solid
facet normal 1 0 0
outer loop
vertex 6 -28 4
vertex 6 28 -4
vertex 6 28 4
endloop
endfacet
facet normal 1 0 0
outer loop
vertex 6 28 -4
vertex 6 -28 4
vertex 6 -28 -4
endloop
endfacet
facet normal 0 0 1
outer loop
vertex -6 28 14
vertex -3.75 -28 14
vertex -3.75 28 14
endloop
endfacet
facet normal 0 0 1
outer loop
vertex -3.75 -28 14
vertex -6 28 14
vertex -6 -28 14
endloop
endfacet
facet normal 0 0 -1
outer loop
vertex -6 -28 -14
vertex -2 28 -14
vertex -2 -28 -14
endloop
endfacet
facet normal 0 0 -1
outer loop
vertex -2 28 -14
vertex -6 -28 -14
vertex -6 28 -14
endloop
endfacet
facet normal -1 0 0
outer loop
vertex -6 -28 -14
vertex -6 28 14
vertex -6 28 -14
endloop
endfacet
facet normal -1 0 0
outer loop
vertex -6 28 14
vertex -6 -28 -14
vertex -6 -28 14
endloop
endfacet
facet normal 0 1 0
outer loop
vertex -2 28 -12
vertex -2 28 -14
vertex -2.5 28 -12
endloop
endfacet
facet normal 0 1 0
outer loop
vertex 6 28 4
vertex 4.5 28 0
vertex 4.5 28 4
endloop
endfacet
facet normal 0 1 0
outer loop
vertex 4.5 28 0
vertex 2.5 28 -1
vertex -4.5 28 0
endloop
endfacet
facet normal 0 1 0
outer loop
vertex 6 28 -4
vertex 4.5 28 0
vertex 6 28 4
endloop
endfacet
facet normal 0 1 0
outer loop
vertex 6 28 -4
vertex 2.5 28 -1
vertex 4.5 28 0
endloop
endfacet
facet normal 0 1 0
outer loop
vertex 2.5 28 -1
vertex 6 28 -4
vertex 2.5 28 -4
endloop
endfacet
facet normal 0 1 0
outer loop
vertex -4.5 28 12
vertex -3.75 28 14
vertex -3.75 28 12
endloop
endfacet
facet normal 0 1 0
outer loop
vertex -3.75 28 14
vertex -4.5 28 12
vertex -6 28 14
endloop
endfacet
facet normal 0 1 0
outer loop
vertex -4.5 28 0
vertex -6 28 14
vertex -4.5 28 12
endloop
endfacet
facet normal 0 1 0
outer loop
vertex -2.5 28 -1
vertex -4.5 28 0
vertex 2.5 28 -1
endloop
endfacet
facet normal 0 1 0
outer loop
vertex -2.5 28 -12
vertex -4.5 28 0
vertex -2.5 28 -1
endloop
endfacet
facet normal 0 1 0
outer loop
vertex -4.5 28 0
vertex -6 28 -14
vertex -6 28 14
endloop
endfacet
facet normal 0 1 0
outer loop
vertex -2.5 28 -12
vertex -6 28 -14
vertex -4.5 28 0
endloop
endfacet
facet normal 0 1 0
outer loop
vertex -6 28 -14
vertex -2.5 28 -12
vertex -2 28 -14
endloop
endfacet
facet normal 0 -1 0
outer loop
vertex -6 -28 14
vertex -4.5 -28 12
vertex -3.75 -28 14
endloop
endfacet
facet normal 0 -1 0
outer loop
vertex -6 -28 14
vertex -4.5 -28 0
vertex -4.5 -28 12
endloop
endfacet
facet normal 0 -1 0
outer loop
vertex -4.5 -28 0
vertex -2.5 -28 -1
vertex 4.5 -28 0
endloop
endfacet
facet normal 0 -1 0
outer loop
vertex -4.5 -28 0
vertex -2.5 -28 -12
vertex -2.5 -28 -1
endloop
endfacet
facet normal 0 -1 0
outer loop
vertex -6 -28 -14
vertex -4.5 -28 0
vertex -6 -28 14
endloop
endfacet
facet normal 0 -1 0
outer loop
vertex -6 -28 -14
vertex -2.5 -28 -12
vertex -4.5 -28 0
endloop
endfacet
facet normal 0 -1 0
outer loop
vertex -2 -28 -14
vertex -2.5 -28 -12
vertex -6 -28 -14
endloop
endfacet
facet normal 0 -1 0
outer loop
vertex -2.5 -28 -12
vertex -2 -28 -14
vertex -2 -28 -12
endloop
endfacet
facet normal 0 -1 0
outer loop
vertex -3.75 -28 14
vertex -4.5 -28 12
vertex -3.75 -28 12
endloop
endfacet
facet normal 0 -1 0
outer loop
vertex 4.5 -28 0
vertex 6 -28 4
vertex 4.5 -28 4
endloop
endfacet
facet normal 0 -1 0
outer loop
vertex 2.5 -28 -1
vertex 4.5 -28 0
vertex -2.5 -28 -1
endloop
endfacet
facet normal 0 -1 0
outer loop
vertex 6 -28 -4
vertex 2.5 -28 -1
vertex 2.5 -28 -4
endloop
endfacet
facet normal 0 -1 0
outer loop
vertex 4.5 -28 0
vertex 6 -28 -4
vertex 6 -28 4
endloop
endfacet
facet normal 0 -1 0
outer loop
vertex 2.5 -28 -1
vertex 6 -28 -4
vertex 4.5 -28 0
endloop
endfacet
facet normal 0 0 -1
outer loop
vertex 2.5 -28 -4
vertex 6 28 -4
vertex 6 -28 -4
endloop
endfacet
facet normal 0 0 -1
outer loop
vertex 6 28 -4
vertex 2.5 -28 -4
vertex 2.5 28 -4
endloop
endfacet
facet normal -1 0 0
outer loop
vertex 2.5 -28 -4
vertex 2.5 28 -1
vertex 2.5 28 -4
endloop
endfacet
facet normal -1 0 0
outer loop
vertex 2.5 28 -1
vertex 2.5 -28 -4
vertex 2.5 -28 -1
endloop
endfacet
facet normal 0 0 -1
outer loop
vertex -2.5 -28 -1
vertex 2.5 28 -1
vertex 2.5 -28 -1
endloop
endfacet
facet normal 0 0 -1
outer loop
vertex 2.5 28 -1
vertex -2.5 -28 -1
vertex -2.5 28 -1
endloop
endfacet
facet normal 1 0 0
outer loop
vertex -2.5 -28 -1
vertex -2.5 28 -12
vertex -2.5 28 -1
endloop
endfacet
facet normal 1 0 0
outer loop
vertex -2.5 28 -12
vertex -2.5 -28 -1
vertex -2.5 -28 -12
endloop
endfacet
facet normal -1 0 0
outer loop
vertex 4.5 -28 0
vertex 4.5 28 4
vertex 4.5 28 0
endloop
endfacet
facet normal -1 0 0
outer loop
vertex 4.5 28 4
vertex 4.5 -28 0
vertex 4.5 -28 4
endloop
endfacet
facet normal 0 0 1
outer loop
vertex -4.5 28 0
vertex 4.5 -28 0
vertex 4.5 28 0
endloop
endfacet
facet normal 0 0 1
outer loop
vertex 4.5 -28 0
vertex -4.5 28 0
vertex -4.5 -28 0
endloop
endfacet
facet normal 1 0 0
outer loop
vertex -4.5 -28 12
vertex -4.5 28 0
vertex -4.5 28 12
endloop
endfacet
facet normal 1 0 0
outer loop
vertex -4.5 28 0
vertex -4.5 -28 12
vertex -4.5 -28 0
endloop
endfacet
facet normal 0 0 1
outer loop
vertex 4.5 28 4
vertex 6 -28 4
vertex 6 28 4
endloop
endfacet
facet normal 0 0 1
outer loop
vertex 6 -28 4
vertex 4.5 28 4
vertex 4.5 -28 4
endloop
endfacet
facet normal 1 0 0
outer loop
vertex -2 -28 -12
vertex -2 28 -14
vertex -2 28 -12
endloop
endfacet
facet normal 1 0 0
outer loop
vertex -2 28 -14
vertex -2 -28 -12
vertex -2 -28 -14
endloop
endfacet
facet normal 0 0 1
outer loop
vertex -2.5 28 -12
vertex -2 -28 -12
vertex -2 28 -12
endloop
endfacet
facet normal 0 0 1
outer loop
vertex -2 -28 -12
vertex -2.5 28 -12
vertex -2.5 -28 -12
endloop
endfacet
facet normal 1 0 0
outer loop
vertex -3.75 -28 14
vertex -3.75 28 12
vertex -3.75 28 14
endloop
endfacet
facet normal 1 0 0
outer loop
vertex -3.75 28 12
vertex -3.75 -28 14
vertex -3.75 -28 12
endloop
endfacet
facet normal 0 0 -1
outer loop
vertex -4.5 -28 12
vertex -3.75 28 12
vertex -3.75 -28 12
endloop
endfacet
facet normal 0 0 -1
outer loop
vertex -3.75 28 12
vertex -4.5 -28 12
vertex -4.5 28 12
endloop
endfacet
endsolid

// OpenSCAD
difference() {
cube([12, 56, 28], true);

color("white") translate([5, 0, -14]) cube([6, 60, 20], true);

color("green") translate([0, 0, -11]) cube([5, 60, 20], true);
    
  color("blue")   translate([0, 0, 10]) cube([9, 60, 20], true);
  
  color("red")   translate([5, 0, 14]) cube([8, 60, 20], true);
}

translate([-3, 0, -13]) cube([2, 56, 2], true);

translate([-4.5, 0, 13]) cube([1.5, 56, 2], true);
